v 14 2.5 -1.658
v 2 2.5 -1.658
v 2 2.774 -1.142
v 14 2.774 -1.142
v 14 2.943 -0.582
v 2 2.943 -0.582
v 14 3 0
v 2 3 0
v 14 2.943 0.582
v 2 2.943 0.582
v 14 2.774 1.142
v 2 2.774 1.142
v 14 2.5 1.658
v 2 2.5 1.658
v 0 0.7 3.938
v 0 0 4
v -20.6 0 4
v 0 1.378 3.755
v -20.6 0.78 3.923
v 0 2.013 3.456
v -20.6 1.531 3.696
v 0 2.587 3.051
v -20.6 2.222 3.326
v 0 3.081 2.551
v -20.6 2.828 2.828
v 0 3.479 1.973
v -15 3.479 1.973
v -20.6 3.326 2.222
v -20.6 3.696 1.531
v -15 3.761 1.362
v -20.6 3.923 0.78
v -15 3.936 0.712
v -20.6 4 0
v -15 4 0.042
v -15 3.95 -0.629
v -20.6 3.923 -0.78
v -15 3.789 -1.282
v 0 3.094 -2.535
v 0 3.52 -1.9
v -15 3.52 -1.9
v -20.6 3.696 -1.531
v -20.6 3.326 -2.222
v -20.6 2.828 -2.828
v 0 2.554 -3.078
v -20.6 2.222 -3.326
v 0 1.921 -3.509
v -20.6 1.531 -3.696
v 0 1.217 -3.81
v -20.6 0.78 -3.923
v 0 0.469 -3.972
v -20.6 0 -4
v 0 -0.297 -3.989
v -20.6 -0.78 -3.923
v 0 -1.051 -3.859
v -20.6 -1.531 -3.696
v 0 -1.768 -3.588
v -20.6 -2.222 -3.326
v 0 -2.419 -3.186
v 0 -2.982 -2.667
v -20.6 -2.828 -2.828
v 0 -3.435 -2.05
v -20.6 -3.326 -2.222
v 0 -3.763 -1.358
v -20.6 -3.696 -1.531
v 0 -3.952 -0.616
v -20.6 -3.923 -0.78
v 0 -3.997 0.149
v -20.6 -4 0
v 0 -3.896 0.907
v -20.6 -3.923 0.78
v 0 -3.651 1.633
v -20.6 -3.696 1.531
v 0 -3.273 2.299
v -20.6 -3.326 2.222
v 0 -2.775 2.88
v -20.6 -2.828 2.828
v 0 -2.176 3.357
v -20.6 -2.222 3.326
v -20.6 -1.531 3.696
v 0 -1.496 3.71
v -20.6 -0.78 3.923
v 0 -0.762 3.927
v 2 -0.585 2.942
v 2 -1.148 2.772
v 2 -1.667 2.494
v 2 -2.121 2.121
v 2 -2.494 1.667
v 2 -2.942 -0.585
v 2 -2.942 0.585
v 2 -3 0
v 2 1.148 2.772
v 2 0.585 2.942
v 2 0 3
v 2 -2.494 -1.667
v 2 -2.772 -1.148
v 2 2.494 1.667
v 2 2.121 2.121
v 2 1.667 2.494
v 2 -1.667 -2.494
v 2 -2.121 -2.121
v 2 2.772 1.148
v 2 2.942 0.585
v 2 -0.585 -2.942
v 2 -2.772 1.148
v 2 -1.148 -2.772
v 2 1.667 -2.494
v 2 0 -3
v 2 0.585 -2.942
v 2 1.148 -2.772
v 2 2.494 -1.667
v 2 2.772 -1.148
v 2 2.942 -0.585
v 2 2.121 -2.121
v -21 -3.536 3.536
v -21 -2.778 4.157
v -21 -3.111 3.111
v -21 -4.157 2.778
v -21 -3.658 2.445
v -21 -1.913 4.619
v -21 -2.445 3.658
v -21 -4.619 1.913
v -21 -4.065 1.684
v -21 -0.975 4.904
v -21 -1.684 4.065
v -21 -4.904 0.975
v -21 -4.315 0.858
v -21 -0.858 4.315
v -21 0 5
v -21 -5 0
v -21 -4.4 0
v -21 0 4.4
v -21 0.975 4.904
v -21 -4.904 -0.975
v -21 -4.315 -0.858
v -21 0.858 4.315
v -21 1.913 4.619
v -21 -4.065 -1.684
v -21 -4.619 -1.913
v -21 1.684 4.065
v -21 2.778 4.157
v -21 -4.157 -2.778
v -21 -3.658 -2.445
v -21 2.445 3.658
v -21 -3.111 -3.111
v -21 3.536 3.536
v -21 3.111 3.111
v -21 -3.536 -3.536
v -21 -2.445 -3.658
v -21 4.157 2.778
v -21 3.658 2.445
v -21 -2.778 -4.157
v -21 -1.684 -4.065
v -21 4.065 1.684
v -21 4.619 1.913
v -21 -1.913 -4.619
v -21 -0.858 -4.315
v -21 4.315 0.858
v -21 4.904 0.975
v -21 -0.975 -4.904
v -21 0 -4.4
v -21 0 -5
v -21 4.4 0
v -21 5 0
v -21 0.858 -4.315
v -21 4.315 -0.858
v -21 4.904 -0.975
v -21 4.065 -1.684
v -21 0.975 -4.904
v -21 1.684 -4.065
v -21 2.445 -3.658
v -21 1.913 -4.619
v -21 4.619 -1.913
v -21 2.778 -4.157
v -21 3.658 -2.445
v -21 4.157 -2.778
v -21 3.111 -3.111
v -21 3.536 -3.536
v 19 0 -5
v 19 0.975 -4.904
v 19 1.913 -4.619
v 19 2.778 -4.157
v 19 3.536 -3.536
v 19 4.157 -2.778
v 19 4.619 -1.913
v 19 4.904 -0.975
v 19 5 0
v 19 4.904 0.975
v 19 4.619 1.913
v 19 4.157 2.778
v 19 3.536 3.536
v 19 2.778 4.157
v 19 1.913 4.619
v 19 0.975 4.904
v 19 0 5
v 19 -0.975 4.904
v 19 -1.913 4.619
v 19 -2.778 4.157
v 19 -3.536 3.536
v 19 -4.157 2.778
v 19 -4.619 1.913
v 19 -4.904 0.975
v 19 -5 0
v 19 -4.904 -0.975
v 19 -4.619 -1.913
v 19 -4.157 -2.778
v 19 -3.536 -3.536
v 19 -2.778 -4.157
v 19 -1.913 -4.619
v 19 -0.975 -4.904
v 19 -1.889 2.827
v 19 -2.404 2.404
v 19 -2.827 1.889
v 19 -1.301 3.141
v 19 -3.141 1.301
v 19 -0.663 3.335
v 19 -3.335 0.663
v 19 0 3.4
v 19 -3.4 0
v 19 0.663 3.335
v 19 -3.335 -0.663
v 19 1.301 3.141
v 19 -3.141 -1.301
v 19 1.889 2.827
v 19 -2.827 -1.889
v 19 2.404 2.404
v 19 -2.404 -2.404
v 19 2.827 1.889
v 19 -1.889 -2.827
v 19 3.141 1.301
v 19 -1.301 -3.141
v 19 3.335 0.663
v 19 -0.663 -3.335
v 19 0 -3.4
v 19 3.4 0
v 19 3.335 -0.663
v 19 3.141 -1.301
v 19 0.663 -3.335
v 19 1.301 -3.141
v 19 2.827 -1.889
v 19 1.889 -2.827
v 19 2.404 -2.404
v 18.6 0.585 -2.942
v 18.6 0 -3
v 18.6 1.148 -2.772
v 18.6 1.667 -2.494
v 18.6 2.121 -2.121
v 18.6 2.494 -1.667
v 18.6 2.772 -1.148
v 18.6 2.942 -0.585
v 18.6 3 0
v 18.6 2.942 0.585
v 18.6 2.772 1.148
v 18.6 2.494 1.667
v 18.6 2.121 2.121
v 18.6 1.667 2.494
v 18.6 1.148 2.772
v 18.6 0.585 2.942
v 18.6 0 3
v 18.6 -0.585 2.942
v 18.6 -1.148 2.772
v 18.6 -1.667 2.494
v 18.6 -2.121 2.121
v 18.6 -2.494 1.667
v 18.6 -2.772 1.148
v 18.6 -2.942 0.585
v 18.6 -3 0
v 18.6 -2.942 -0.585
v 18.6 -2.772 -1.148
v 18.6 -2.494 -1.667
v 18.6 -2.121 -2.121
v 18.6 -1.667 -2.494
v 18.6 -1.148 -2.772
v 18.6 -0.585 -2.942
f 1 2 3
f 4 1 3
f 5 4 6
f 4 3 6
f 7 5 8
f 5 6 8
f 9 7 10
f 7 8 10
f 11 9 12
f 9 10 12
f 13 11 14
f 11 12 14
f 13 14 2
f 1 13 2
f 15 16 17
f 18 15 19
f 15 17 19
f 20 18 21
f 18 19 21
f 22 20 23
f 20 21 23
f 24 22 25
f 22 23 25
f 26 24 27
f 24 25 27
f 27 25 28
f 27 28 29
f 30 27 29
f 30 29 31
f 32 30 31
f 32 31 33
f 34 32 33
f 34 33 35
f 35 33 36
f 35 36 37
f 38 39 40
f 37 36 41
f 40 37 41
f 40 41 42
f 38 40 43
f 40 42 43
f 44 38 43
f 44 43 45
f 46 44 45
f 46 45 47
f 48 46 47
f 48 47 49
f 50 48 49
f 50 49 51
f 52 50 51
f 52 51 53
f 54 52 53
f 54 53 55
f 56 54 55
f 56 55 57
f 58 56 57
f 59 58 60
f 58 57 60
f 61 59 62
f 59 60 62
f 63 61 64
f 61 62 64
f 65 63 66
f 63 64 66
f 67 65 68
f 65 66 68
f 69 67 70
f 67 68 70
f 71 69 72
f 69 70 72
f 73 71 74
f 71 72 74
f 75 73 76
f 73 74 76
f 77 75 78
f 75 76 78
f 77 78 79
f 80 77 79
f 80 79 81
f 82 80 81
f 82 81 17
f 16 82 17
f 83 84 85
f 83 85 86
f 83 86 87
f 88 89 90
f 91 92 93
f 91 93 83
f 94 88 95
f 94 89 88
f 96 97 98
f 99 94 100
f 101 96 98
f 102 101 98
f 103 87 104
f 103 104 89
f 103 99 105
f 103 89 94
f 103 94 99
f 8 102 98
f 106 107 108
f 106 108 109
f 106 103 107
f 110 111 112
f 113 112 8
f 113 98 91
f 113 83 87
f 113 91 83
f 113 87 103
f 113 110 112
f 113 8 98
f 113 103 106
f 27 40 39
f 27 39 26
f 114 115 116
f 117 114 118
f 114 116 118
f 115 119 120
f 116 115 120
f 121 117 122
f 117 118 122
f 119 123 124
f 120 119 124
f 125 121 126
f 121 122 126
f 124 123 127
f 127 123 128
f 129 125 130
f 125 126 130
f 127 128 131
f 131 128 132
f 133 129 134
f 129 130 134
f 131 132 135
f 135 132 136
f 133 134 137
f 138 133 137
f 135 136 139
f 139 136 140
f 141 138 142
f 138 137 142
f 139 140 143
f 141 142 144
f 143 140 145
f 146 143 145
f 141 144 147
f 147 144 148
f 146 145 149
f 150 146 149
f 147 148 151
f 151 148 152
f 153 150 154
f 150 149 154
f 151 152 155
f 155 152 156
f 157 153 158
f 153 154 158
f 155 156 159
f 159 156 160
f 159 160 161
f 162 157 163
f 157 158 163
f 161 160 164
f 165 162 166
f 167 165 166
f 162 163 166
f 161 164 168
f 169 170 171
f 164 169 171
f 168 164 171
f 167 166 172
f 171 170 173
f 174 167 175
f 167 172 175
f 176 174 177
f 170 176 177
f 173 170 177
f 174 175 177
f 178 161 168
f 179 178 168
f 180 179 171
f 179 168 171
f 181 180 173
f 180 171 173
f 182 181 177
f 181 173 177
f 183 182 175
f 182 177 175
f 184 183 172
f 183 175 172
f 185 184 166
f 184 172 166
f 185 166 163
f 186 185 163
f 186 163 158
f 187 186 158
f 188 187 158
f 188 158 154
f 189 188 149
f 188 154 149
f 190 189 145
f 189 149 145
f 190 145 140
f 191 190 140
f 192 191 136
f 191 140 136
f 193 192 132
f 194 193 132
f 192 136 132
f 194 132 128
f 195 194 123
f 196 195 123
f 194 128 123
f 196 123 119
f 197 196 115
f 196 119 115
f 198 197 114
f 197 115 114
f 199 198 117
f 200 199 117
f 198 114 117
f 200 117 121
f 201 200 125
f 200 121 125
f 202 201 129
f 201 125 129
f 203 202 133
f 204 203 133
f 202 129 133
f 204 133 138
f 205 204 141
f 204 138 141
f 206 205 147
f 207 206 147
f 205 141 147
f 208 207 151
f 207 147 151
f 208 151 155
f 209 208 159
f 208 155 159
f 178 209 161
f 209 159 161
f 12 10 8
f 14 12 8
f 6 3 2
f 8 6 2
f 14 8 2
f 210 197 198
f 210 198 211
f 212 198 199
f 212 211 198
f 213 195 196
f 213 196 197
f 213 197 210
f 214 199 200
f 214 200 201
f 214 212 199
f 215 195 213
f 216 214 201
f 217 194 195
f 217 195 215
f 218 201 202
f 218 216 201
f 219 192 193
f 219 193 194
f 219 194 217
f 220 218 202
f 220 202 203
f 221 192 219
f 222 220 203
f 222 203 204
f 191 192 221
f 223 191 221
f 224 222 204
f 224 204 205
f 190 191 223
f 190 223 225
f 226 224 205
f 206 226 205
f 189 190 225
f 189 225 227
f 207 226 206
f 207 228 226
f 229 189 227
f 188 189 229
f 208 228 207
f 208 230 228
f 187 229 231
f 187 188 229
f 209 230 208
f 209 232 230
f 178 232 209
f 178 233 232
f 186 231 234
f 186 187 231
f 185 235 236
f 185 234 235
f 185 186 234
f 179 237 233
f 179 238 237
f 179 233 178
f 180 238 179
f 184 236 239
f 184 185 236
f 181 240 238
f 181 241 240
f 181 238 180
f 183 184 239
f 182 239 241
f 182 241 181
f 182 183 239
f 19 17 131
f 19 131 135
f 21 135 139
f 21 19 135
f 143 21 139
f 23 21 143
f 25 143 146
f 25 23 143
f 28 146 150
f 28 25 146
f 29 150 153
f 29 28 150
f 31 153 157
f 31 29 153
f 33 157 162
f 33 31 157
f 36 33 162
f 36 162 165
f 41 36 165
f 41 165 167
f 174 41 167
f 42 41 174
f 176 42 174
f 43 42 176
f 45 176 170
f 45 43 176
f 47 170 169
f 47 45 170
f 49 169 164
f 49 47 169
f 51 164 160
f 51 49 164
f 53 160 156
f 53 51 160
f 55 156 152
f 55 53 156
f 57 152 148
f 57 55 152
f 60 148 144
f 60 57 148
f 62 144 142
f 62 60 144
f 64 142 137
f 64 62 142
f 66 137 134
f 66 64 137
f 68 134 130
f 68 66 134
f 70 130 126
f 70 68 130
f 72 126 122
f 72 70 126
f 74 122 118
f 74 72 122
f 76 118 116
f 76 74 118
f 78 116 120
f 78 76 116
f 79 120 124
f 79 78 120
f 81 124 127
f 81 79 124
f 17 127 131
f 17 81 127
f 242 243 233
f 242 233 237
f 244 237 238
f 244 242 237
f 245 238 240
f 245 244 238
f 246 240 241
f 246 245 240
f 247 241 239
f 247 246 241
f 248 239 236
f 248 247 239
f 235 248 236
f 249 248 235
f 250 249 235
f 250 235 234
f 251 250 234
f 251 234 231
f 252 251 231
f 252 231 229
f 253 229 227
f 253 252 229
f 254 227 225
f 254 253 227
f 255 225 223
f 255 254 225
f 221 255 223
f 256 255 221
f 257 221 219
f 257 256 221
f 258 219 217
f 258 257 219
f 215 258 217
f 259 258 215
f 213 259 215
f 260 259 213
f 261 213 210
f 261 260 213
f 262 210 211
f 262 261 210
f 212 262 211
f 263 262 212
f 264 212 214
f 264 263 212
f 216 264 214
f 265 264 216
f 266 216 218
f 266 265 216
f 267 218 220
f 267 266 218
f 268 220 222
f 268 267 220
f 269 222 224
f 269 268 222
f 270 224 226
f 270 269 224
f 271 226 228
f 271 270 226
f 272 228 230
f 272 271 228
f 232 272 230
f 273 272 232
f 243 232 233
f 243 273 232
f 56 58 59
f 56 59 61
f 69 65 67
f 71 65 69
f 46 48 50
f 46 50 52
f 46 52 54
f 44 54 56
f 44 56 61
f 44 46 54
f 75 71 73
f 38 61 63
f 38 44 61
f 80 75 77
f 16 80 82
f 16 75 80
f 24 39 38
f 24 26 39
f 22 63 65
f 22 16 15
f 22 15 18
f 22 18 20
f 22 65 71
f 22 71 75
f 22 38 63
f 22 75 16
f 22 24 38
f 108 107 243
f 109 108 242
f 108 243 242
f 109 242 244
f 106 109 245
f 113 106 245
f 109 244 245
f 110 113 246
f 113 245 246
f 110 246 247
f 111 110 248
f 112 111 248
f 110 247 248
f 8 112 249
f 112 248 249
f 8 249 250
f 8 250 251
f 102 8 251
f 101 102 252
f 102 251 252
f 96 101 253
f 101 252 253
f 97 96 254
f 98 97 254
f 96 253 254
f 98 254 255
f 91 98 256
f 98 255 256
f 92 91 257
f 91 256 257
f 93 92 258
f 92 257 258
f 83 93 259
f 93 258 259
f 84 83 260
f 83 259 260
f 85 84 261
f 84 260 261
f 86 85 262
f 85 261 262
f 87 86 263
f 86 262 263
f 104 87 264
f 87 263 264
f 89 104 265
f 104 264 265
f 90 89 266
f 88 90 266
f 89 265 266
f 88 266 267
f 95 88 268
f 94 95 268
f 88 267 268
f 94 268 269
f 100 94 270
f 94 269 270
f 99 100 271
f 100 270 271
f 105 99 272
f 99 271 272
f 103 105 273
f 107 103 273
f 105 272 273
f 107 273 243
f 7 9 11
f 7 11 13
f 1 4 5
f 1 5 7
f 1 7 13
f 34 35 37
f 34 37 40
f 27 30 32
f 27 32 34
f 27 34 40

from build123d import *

# Parameters (mm, degrees)
EXTRUDE_1_DEPTH      = 19
EXTRUDE_1_DEPTH_BACK = 21
SKETCH_1_R           = 5
SKETCH_3_R           = 3
CUT_EXTRUDE_1_DEPTH  = 17
SKETCH_4_R           = 4
CUT_EXTRUDE_2_DEPTH  = 21
EXTRUDE_2_DEPTH      = 12
EXTRUDE_START        = 15
EXTRUDE_3_DEPTH      = 15
CHAMFER_1_SIZE       = 0.4


with BuildPart() as part:
    # 草图1 → 凸台-拉伸1 (new, two sides: drawn at the far end of the back side and taken through both)
    with BuildSketch(Plane(origin=(0, 0, 0), x_dir=(0, 0, -1), z_dir=(1, 0, 0)).offset(-EXTRUDE_1_DEPTH_BACK)):
        Circle(SKETCH_1_R)
    extrude(amount=EXTRUDE_1_DEPTH + EXTRUDE_1_DEPTH_BACK)

    # 草图3 → 切除-拉伸1 (cut)
    with BuildSketch(Plane(origin=(19, 0, 0), x_dir=(0, 0, -1), z_dir=(1, 0, 0))):
        Circle(SKETCH_3_R)
    extrude(amount=-CUT_EXTRUDE_1_DEPTH, mode=Mode.SUBTRACT)

    # 草图4 → 切除-拉伸2 (cut)
    with BuildSketch(Plane.ZY.offset(21)):
        Circle(SKETCH_4_R)
    extrude(amount=-CUT_EXTRUDE_2_DEPTH, mode=Mode.SUBTRACT)

    # 草图6 → 凸台-拉伸3 (add)
    with BuildSketch(Plane.ZY.offset(EXTRUDE_START)):
        with BuildLine():
            Line((-1.899540758, 3.520191033), (1.973227995, 3.479421113))
            ThreePointArc((1.973227995, 3.479421113), (0.042106993, 3.999778369), (-1.899540758, 3.520191033))
        make_face()
    extrude(amount=-EXTRUDE_3_DEPTH)

    # 倒角1
    chamfer_1_edges = [part.edges().sort_by_distance(p)[0] for p in [
        (-21, 0, -4),
        (19, 0, 3),
    ]]
    chamfer(chamfer_1_edges, length=CHAMFER_1_SIZE)


with BuildPart() as body_2:
    # 草图5 → 凸台-拉伸2 (new body)
    with BuildSketch(Plane(origin=(2, 0, 0), x_dir=(0, 0, -1), z_dir=(1, 0, 0))):
        with BuildLine():
            Line((-1.658312395, 2.5), (1.658312395, 2.5))
            ThreePointArc((1.658312395, 2.5), (0, 3), (-1.658312395, 2.5))
        make_face()
    extrude(amount=EXTRUDE_2_DEPTH)


solid = Compound([part.part, body_2.part])
